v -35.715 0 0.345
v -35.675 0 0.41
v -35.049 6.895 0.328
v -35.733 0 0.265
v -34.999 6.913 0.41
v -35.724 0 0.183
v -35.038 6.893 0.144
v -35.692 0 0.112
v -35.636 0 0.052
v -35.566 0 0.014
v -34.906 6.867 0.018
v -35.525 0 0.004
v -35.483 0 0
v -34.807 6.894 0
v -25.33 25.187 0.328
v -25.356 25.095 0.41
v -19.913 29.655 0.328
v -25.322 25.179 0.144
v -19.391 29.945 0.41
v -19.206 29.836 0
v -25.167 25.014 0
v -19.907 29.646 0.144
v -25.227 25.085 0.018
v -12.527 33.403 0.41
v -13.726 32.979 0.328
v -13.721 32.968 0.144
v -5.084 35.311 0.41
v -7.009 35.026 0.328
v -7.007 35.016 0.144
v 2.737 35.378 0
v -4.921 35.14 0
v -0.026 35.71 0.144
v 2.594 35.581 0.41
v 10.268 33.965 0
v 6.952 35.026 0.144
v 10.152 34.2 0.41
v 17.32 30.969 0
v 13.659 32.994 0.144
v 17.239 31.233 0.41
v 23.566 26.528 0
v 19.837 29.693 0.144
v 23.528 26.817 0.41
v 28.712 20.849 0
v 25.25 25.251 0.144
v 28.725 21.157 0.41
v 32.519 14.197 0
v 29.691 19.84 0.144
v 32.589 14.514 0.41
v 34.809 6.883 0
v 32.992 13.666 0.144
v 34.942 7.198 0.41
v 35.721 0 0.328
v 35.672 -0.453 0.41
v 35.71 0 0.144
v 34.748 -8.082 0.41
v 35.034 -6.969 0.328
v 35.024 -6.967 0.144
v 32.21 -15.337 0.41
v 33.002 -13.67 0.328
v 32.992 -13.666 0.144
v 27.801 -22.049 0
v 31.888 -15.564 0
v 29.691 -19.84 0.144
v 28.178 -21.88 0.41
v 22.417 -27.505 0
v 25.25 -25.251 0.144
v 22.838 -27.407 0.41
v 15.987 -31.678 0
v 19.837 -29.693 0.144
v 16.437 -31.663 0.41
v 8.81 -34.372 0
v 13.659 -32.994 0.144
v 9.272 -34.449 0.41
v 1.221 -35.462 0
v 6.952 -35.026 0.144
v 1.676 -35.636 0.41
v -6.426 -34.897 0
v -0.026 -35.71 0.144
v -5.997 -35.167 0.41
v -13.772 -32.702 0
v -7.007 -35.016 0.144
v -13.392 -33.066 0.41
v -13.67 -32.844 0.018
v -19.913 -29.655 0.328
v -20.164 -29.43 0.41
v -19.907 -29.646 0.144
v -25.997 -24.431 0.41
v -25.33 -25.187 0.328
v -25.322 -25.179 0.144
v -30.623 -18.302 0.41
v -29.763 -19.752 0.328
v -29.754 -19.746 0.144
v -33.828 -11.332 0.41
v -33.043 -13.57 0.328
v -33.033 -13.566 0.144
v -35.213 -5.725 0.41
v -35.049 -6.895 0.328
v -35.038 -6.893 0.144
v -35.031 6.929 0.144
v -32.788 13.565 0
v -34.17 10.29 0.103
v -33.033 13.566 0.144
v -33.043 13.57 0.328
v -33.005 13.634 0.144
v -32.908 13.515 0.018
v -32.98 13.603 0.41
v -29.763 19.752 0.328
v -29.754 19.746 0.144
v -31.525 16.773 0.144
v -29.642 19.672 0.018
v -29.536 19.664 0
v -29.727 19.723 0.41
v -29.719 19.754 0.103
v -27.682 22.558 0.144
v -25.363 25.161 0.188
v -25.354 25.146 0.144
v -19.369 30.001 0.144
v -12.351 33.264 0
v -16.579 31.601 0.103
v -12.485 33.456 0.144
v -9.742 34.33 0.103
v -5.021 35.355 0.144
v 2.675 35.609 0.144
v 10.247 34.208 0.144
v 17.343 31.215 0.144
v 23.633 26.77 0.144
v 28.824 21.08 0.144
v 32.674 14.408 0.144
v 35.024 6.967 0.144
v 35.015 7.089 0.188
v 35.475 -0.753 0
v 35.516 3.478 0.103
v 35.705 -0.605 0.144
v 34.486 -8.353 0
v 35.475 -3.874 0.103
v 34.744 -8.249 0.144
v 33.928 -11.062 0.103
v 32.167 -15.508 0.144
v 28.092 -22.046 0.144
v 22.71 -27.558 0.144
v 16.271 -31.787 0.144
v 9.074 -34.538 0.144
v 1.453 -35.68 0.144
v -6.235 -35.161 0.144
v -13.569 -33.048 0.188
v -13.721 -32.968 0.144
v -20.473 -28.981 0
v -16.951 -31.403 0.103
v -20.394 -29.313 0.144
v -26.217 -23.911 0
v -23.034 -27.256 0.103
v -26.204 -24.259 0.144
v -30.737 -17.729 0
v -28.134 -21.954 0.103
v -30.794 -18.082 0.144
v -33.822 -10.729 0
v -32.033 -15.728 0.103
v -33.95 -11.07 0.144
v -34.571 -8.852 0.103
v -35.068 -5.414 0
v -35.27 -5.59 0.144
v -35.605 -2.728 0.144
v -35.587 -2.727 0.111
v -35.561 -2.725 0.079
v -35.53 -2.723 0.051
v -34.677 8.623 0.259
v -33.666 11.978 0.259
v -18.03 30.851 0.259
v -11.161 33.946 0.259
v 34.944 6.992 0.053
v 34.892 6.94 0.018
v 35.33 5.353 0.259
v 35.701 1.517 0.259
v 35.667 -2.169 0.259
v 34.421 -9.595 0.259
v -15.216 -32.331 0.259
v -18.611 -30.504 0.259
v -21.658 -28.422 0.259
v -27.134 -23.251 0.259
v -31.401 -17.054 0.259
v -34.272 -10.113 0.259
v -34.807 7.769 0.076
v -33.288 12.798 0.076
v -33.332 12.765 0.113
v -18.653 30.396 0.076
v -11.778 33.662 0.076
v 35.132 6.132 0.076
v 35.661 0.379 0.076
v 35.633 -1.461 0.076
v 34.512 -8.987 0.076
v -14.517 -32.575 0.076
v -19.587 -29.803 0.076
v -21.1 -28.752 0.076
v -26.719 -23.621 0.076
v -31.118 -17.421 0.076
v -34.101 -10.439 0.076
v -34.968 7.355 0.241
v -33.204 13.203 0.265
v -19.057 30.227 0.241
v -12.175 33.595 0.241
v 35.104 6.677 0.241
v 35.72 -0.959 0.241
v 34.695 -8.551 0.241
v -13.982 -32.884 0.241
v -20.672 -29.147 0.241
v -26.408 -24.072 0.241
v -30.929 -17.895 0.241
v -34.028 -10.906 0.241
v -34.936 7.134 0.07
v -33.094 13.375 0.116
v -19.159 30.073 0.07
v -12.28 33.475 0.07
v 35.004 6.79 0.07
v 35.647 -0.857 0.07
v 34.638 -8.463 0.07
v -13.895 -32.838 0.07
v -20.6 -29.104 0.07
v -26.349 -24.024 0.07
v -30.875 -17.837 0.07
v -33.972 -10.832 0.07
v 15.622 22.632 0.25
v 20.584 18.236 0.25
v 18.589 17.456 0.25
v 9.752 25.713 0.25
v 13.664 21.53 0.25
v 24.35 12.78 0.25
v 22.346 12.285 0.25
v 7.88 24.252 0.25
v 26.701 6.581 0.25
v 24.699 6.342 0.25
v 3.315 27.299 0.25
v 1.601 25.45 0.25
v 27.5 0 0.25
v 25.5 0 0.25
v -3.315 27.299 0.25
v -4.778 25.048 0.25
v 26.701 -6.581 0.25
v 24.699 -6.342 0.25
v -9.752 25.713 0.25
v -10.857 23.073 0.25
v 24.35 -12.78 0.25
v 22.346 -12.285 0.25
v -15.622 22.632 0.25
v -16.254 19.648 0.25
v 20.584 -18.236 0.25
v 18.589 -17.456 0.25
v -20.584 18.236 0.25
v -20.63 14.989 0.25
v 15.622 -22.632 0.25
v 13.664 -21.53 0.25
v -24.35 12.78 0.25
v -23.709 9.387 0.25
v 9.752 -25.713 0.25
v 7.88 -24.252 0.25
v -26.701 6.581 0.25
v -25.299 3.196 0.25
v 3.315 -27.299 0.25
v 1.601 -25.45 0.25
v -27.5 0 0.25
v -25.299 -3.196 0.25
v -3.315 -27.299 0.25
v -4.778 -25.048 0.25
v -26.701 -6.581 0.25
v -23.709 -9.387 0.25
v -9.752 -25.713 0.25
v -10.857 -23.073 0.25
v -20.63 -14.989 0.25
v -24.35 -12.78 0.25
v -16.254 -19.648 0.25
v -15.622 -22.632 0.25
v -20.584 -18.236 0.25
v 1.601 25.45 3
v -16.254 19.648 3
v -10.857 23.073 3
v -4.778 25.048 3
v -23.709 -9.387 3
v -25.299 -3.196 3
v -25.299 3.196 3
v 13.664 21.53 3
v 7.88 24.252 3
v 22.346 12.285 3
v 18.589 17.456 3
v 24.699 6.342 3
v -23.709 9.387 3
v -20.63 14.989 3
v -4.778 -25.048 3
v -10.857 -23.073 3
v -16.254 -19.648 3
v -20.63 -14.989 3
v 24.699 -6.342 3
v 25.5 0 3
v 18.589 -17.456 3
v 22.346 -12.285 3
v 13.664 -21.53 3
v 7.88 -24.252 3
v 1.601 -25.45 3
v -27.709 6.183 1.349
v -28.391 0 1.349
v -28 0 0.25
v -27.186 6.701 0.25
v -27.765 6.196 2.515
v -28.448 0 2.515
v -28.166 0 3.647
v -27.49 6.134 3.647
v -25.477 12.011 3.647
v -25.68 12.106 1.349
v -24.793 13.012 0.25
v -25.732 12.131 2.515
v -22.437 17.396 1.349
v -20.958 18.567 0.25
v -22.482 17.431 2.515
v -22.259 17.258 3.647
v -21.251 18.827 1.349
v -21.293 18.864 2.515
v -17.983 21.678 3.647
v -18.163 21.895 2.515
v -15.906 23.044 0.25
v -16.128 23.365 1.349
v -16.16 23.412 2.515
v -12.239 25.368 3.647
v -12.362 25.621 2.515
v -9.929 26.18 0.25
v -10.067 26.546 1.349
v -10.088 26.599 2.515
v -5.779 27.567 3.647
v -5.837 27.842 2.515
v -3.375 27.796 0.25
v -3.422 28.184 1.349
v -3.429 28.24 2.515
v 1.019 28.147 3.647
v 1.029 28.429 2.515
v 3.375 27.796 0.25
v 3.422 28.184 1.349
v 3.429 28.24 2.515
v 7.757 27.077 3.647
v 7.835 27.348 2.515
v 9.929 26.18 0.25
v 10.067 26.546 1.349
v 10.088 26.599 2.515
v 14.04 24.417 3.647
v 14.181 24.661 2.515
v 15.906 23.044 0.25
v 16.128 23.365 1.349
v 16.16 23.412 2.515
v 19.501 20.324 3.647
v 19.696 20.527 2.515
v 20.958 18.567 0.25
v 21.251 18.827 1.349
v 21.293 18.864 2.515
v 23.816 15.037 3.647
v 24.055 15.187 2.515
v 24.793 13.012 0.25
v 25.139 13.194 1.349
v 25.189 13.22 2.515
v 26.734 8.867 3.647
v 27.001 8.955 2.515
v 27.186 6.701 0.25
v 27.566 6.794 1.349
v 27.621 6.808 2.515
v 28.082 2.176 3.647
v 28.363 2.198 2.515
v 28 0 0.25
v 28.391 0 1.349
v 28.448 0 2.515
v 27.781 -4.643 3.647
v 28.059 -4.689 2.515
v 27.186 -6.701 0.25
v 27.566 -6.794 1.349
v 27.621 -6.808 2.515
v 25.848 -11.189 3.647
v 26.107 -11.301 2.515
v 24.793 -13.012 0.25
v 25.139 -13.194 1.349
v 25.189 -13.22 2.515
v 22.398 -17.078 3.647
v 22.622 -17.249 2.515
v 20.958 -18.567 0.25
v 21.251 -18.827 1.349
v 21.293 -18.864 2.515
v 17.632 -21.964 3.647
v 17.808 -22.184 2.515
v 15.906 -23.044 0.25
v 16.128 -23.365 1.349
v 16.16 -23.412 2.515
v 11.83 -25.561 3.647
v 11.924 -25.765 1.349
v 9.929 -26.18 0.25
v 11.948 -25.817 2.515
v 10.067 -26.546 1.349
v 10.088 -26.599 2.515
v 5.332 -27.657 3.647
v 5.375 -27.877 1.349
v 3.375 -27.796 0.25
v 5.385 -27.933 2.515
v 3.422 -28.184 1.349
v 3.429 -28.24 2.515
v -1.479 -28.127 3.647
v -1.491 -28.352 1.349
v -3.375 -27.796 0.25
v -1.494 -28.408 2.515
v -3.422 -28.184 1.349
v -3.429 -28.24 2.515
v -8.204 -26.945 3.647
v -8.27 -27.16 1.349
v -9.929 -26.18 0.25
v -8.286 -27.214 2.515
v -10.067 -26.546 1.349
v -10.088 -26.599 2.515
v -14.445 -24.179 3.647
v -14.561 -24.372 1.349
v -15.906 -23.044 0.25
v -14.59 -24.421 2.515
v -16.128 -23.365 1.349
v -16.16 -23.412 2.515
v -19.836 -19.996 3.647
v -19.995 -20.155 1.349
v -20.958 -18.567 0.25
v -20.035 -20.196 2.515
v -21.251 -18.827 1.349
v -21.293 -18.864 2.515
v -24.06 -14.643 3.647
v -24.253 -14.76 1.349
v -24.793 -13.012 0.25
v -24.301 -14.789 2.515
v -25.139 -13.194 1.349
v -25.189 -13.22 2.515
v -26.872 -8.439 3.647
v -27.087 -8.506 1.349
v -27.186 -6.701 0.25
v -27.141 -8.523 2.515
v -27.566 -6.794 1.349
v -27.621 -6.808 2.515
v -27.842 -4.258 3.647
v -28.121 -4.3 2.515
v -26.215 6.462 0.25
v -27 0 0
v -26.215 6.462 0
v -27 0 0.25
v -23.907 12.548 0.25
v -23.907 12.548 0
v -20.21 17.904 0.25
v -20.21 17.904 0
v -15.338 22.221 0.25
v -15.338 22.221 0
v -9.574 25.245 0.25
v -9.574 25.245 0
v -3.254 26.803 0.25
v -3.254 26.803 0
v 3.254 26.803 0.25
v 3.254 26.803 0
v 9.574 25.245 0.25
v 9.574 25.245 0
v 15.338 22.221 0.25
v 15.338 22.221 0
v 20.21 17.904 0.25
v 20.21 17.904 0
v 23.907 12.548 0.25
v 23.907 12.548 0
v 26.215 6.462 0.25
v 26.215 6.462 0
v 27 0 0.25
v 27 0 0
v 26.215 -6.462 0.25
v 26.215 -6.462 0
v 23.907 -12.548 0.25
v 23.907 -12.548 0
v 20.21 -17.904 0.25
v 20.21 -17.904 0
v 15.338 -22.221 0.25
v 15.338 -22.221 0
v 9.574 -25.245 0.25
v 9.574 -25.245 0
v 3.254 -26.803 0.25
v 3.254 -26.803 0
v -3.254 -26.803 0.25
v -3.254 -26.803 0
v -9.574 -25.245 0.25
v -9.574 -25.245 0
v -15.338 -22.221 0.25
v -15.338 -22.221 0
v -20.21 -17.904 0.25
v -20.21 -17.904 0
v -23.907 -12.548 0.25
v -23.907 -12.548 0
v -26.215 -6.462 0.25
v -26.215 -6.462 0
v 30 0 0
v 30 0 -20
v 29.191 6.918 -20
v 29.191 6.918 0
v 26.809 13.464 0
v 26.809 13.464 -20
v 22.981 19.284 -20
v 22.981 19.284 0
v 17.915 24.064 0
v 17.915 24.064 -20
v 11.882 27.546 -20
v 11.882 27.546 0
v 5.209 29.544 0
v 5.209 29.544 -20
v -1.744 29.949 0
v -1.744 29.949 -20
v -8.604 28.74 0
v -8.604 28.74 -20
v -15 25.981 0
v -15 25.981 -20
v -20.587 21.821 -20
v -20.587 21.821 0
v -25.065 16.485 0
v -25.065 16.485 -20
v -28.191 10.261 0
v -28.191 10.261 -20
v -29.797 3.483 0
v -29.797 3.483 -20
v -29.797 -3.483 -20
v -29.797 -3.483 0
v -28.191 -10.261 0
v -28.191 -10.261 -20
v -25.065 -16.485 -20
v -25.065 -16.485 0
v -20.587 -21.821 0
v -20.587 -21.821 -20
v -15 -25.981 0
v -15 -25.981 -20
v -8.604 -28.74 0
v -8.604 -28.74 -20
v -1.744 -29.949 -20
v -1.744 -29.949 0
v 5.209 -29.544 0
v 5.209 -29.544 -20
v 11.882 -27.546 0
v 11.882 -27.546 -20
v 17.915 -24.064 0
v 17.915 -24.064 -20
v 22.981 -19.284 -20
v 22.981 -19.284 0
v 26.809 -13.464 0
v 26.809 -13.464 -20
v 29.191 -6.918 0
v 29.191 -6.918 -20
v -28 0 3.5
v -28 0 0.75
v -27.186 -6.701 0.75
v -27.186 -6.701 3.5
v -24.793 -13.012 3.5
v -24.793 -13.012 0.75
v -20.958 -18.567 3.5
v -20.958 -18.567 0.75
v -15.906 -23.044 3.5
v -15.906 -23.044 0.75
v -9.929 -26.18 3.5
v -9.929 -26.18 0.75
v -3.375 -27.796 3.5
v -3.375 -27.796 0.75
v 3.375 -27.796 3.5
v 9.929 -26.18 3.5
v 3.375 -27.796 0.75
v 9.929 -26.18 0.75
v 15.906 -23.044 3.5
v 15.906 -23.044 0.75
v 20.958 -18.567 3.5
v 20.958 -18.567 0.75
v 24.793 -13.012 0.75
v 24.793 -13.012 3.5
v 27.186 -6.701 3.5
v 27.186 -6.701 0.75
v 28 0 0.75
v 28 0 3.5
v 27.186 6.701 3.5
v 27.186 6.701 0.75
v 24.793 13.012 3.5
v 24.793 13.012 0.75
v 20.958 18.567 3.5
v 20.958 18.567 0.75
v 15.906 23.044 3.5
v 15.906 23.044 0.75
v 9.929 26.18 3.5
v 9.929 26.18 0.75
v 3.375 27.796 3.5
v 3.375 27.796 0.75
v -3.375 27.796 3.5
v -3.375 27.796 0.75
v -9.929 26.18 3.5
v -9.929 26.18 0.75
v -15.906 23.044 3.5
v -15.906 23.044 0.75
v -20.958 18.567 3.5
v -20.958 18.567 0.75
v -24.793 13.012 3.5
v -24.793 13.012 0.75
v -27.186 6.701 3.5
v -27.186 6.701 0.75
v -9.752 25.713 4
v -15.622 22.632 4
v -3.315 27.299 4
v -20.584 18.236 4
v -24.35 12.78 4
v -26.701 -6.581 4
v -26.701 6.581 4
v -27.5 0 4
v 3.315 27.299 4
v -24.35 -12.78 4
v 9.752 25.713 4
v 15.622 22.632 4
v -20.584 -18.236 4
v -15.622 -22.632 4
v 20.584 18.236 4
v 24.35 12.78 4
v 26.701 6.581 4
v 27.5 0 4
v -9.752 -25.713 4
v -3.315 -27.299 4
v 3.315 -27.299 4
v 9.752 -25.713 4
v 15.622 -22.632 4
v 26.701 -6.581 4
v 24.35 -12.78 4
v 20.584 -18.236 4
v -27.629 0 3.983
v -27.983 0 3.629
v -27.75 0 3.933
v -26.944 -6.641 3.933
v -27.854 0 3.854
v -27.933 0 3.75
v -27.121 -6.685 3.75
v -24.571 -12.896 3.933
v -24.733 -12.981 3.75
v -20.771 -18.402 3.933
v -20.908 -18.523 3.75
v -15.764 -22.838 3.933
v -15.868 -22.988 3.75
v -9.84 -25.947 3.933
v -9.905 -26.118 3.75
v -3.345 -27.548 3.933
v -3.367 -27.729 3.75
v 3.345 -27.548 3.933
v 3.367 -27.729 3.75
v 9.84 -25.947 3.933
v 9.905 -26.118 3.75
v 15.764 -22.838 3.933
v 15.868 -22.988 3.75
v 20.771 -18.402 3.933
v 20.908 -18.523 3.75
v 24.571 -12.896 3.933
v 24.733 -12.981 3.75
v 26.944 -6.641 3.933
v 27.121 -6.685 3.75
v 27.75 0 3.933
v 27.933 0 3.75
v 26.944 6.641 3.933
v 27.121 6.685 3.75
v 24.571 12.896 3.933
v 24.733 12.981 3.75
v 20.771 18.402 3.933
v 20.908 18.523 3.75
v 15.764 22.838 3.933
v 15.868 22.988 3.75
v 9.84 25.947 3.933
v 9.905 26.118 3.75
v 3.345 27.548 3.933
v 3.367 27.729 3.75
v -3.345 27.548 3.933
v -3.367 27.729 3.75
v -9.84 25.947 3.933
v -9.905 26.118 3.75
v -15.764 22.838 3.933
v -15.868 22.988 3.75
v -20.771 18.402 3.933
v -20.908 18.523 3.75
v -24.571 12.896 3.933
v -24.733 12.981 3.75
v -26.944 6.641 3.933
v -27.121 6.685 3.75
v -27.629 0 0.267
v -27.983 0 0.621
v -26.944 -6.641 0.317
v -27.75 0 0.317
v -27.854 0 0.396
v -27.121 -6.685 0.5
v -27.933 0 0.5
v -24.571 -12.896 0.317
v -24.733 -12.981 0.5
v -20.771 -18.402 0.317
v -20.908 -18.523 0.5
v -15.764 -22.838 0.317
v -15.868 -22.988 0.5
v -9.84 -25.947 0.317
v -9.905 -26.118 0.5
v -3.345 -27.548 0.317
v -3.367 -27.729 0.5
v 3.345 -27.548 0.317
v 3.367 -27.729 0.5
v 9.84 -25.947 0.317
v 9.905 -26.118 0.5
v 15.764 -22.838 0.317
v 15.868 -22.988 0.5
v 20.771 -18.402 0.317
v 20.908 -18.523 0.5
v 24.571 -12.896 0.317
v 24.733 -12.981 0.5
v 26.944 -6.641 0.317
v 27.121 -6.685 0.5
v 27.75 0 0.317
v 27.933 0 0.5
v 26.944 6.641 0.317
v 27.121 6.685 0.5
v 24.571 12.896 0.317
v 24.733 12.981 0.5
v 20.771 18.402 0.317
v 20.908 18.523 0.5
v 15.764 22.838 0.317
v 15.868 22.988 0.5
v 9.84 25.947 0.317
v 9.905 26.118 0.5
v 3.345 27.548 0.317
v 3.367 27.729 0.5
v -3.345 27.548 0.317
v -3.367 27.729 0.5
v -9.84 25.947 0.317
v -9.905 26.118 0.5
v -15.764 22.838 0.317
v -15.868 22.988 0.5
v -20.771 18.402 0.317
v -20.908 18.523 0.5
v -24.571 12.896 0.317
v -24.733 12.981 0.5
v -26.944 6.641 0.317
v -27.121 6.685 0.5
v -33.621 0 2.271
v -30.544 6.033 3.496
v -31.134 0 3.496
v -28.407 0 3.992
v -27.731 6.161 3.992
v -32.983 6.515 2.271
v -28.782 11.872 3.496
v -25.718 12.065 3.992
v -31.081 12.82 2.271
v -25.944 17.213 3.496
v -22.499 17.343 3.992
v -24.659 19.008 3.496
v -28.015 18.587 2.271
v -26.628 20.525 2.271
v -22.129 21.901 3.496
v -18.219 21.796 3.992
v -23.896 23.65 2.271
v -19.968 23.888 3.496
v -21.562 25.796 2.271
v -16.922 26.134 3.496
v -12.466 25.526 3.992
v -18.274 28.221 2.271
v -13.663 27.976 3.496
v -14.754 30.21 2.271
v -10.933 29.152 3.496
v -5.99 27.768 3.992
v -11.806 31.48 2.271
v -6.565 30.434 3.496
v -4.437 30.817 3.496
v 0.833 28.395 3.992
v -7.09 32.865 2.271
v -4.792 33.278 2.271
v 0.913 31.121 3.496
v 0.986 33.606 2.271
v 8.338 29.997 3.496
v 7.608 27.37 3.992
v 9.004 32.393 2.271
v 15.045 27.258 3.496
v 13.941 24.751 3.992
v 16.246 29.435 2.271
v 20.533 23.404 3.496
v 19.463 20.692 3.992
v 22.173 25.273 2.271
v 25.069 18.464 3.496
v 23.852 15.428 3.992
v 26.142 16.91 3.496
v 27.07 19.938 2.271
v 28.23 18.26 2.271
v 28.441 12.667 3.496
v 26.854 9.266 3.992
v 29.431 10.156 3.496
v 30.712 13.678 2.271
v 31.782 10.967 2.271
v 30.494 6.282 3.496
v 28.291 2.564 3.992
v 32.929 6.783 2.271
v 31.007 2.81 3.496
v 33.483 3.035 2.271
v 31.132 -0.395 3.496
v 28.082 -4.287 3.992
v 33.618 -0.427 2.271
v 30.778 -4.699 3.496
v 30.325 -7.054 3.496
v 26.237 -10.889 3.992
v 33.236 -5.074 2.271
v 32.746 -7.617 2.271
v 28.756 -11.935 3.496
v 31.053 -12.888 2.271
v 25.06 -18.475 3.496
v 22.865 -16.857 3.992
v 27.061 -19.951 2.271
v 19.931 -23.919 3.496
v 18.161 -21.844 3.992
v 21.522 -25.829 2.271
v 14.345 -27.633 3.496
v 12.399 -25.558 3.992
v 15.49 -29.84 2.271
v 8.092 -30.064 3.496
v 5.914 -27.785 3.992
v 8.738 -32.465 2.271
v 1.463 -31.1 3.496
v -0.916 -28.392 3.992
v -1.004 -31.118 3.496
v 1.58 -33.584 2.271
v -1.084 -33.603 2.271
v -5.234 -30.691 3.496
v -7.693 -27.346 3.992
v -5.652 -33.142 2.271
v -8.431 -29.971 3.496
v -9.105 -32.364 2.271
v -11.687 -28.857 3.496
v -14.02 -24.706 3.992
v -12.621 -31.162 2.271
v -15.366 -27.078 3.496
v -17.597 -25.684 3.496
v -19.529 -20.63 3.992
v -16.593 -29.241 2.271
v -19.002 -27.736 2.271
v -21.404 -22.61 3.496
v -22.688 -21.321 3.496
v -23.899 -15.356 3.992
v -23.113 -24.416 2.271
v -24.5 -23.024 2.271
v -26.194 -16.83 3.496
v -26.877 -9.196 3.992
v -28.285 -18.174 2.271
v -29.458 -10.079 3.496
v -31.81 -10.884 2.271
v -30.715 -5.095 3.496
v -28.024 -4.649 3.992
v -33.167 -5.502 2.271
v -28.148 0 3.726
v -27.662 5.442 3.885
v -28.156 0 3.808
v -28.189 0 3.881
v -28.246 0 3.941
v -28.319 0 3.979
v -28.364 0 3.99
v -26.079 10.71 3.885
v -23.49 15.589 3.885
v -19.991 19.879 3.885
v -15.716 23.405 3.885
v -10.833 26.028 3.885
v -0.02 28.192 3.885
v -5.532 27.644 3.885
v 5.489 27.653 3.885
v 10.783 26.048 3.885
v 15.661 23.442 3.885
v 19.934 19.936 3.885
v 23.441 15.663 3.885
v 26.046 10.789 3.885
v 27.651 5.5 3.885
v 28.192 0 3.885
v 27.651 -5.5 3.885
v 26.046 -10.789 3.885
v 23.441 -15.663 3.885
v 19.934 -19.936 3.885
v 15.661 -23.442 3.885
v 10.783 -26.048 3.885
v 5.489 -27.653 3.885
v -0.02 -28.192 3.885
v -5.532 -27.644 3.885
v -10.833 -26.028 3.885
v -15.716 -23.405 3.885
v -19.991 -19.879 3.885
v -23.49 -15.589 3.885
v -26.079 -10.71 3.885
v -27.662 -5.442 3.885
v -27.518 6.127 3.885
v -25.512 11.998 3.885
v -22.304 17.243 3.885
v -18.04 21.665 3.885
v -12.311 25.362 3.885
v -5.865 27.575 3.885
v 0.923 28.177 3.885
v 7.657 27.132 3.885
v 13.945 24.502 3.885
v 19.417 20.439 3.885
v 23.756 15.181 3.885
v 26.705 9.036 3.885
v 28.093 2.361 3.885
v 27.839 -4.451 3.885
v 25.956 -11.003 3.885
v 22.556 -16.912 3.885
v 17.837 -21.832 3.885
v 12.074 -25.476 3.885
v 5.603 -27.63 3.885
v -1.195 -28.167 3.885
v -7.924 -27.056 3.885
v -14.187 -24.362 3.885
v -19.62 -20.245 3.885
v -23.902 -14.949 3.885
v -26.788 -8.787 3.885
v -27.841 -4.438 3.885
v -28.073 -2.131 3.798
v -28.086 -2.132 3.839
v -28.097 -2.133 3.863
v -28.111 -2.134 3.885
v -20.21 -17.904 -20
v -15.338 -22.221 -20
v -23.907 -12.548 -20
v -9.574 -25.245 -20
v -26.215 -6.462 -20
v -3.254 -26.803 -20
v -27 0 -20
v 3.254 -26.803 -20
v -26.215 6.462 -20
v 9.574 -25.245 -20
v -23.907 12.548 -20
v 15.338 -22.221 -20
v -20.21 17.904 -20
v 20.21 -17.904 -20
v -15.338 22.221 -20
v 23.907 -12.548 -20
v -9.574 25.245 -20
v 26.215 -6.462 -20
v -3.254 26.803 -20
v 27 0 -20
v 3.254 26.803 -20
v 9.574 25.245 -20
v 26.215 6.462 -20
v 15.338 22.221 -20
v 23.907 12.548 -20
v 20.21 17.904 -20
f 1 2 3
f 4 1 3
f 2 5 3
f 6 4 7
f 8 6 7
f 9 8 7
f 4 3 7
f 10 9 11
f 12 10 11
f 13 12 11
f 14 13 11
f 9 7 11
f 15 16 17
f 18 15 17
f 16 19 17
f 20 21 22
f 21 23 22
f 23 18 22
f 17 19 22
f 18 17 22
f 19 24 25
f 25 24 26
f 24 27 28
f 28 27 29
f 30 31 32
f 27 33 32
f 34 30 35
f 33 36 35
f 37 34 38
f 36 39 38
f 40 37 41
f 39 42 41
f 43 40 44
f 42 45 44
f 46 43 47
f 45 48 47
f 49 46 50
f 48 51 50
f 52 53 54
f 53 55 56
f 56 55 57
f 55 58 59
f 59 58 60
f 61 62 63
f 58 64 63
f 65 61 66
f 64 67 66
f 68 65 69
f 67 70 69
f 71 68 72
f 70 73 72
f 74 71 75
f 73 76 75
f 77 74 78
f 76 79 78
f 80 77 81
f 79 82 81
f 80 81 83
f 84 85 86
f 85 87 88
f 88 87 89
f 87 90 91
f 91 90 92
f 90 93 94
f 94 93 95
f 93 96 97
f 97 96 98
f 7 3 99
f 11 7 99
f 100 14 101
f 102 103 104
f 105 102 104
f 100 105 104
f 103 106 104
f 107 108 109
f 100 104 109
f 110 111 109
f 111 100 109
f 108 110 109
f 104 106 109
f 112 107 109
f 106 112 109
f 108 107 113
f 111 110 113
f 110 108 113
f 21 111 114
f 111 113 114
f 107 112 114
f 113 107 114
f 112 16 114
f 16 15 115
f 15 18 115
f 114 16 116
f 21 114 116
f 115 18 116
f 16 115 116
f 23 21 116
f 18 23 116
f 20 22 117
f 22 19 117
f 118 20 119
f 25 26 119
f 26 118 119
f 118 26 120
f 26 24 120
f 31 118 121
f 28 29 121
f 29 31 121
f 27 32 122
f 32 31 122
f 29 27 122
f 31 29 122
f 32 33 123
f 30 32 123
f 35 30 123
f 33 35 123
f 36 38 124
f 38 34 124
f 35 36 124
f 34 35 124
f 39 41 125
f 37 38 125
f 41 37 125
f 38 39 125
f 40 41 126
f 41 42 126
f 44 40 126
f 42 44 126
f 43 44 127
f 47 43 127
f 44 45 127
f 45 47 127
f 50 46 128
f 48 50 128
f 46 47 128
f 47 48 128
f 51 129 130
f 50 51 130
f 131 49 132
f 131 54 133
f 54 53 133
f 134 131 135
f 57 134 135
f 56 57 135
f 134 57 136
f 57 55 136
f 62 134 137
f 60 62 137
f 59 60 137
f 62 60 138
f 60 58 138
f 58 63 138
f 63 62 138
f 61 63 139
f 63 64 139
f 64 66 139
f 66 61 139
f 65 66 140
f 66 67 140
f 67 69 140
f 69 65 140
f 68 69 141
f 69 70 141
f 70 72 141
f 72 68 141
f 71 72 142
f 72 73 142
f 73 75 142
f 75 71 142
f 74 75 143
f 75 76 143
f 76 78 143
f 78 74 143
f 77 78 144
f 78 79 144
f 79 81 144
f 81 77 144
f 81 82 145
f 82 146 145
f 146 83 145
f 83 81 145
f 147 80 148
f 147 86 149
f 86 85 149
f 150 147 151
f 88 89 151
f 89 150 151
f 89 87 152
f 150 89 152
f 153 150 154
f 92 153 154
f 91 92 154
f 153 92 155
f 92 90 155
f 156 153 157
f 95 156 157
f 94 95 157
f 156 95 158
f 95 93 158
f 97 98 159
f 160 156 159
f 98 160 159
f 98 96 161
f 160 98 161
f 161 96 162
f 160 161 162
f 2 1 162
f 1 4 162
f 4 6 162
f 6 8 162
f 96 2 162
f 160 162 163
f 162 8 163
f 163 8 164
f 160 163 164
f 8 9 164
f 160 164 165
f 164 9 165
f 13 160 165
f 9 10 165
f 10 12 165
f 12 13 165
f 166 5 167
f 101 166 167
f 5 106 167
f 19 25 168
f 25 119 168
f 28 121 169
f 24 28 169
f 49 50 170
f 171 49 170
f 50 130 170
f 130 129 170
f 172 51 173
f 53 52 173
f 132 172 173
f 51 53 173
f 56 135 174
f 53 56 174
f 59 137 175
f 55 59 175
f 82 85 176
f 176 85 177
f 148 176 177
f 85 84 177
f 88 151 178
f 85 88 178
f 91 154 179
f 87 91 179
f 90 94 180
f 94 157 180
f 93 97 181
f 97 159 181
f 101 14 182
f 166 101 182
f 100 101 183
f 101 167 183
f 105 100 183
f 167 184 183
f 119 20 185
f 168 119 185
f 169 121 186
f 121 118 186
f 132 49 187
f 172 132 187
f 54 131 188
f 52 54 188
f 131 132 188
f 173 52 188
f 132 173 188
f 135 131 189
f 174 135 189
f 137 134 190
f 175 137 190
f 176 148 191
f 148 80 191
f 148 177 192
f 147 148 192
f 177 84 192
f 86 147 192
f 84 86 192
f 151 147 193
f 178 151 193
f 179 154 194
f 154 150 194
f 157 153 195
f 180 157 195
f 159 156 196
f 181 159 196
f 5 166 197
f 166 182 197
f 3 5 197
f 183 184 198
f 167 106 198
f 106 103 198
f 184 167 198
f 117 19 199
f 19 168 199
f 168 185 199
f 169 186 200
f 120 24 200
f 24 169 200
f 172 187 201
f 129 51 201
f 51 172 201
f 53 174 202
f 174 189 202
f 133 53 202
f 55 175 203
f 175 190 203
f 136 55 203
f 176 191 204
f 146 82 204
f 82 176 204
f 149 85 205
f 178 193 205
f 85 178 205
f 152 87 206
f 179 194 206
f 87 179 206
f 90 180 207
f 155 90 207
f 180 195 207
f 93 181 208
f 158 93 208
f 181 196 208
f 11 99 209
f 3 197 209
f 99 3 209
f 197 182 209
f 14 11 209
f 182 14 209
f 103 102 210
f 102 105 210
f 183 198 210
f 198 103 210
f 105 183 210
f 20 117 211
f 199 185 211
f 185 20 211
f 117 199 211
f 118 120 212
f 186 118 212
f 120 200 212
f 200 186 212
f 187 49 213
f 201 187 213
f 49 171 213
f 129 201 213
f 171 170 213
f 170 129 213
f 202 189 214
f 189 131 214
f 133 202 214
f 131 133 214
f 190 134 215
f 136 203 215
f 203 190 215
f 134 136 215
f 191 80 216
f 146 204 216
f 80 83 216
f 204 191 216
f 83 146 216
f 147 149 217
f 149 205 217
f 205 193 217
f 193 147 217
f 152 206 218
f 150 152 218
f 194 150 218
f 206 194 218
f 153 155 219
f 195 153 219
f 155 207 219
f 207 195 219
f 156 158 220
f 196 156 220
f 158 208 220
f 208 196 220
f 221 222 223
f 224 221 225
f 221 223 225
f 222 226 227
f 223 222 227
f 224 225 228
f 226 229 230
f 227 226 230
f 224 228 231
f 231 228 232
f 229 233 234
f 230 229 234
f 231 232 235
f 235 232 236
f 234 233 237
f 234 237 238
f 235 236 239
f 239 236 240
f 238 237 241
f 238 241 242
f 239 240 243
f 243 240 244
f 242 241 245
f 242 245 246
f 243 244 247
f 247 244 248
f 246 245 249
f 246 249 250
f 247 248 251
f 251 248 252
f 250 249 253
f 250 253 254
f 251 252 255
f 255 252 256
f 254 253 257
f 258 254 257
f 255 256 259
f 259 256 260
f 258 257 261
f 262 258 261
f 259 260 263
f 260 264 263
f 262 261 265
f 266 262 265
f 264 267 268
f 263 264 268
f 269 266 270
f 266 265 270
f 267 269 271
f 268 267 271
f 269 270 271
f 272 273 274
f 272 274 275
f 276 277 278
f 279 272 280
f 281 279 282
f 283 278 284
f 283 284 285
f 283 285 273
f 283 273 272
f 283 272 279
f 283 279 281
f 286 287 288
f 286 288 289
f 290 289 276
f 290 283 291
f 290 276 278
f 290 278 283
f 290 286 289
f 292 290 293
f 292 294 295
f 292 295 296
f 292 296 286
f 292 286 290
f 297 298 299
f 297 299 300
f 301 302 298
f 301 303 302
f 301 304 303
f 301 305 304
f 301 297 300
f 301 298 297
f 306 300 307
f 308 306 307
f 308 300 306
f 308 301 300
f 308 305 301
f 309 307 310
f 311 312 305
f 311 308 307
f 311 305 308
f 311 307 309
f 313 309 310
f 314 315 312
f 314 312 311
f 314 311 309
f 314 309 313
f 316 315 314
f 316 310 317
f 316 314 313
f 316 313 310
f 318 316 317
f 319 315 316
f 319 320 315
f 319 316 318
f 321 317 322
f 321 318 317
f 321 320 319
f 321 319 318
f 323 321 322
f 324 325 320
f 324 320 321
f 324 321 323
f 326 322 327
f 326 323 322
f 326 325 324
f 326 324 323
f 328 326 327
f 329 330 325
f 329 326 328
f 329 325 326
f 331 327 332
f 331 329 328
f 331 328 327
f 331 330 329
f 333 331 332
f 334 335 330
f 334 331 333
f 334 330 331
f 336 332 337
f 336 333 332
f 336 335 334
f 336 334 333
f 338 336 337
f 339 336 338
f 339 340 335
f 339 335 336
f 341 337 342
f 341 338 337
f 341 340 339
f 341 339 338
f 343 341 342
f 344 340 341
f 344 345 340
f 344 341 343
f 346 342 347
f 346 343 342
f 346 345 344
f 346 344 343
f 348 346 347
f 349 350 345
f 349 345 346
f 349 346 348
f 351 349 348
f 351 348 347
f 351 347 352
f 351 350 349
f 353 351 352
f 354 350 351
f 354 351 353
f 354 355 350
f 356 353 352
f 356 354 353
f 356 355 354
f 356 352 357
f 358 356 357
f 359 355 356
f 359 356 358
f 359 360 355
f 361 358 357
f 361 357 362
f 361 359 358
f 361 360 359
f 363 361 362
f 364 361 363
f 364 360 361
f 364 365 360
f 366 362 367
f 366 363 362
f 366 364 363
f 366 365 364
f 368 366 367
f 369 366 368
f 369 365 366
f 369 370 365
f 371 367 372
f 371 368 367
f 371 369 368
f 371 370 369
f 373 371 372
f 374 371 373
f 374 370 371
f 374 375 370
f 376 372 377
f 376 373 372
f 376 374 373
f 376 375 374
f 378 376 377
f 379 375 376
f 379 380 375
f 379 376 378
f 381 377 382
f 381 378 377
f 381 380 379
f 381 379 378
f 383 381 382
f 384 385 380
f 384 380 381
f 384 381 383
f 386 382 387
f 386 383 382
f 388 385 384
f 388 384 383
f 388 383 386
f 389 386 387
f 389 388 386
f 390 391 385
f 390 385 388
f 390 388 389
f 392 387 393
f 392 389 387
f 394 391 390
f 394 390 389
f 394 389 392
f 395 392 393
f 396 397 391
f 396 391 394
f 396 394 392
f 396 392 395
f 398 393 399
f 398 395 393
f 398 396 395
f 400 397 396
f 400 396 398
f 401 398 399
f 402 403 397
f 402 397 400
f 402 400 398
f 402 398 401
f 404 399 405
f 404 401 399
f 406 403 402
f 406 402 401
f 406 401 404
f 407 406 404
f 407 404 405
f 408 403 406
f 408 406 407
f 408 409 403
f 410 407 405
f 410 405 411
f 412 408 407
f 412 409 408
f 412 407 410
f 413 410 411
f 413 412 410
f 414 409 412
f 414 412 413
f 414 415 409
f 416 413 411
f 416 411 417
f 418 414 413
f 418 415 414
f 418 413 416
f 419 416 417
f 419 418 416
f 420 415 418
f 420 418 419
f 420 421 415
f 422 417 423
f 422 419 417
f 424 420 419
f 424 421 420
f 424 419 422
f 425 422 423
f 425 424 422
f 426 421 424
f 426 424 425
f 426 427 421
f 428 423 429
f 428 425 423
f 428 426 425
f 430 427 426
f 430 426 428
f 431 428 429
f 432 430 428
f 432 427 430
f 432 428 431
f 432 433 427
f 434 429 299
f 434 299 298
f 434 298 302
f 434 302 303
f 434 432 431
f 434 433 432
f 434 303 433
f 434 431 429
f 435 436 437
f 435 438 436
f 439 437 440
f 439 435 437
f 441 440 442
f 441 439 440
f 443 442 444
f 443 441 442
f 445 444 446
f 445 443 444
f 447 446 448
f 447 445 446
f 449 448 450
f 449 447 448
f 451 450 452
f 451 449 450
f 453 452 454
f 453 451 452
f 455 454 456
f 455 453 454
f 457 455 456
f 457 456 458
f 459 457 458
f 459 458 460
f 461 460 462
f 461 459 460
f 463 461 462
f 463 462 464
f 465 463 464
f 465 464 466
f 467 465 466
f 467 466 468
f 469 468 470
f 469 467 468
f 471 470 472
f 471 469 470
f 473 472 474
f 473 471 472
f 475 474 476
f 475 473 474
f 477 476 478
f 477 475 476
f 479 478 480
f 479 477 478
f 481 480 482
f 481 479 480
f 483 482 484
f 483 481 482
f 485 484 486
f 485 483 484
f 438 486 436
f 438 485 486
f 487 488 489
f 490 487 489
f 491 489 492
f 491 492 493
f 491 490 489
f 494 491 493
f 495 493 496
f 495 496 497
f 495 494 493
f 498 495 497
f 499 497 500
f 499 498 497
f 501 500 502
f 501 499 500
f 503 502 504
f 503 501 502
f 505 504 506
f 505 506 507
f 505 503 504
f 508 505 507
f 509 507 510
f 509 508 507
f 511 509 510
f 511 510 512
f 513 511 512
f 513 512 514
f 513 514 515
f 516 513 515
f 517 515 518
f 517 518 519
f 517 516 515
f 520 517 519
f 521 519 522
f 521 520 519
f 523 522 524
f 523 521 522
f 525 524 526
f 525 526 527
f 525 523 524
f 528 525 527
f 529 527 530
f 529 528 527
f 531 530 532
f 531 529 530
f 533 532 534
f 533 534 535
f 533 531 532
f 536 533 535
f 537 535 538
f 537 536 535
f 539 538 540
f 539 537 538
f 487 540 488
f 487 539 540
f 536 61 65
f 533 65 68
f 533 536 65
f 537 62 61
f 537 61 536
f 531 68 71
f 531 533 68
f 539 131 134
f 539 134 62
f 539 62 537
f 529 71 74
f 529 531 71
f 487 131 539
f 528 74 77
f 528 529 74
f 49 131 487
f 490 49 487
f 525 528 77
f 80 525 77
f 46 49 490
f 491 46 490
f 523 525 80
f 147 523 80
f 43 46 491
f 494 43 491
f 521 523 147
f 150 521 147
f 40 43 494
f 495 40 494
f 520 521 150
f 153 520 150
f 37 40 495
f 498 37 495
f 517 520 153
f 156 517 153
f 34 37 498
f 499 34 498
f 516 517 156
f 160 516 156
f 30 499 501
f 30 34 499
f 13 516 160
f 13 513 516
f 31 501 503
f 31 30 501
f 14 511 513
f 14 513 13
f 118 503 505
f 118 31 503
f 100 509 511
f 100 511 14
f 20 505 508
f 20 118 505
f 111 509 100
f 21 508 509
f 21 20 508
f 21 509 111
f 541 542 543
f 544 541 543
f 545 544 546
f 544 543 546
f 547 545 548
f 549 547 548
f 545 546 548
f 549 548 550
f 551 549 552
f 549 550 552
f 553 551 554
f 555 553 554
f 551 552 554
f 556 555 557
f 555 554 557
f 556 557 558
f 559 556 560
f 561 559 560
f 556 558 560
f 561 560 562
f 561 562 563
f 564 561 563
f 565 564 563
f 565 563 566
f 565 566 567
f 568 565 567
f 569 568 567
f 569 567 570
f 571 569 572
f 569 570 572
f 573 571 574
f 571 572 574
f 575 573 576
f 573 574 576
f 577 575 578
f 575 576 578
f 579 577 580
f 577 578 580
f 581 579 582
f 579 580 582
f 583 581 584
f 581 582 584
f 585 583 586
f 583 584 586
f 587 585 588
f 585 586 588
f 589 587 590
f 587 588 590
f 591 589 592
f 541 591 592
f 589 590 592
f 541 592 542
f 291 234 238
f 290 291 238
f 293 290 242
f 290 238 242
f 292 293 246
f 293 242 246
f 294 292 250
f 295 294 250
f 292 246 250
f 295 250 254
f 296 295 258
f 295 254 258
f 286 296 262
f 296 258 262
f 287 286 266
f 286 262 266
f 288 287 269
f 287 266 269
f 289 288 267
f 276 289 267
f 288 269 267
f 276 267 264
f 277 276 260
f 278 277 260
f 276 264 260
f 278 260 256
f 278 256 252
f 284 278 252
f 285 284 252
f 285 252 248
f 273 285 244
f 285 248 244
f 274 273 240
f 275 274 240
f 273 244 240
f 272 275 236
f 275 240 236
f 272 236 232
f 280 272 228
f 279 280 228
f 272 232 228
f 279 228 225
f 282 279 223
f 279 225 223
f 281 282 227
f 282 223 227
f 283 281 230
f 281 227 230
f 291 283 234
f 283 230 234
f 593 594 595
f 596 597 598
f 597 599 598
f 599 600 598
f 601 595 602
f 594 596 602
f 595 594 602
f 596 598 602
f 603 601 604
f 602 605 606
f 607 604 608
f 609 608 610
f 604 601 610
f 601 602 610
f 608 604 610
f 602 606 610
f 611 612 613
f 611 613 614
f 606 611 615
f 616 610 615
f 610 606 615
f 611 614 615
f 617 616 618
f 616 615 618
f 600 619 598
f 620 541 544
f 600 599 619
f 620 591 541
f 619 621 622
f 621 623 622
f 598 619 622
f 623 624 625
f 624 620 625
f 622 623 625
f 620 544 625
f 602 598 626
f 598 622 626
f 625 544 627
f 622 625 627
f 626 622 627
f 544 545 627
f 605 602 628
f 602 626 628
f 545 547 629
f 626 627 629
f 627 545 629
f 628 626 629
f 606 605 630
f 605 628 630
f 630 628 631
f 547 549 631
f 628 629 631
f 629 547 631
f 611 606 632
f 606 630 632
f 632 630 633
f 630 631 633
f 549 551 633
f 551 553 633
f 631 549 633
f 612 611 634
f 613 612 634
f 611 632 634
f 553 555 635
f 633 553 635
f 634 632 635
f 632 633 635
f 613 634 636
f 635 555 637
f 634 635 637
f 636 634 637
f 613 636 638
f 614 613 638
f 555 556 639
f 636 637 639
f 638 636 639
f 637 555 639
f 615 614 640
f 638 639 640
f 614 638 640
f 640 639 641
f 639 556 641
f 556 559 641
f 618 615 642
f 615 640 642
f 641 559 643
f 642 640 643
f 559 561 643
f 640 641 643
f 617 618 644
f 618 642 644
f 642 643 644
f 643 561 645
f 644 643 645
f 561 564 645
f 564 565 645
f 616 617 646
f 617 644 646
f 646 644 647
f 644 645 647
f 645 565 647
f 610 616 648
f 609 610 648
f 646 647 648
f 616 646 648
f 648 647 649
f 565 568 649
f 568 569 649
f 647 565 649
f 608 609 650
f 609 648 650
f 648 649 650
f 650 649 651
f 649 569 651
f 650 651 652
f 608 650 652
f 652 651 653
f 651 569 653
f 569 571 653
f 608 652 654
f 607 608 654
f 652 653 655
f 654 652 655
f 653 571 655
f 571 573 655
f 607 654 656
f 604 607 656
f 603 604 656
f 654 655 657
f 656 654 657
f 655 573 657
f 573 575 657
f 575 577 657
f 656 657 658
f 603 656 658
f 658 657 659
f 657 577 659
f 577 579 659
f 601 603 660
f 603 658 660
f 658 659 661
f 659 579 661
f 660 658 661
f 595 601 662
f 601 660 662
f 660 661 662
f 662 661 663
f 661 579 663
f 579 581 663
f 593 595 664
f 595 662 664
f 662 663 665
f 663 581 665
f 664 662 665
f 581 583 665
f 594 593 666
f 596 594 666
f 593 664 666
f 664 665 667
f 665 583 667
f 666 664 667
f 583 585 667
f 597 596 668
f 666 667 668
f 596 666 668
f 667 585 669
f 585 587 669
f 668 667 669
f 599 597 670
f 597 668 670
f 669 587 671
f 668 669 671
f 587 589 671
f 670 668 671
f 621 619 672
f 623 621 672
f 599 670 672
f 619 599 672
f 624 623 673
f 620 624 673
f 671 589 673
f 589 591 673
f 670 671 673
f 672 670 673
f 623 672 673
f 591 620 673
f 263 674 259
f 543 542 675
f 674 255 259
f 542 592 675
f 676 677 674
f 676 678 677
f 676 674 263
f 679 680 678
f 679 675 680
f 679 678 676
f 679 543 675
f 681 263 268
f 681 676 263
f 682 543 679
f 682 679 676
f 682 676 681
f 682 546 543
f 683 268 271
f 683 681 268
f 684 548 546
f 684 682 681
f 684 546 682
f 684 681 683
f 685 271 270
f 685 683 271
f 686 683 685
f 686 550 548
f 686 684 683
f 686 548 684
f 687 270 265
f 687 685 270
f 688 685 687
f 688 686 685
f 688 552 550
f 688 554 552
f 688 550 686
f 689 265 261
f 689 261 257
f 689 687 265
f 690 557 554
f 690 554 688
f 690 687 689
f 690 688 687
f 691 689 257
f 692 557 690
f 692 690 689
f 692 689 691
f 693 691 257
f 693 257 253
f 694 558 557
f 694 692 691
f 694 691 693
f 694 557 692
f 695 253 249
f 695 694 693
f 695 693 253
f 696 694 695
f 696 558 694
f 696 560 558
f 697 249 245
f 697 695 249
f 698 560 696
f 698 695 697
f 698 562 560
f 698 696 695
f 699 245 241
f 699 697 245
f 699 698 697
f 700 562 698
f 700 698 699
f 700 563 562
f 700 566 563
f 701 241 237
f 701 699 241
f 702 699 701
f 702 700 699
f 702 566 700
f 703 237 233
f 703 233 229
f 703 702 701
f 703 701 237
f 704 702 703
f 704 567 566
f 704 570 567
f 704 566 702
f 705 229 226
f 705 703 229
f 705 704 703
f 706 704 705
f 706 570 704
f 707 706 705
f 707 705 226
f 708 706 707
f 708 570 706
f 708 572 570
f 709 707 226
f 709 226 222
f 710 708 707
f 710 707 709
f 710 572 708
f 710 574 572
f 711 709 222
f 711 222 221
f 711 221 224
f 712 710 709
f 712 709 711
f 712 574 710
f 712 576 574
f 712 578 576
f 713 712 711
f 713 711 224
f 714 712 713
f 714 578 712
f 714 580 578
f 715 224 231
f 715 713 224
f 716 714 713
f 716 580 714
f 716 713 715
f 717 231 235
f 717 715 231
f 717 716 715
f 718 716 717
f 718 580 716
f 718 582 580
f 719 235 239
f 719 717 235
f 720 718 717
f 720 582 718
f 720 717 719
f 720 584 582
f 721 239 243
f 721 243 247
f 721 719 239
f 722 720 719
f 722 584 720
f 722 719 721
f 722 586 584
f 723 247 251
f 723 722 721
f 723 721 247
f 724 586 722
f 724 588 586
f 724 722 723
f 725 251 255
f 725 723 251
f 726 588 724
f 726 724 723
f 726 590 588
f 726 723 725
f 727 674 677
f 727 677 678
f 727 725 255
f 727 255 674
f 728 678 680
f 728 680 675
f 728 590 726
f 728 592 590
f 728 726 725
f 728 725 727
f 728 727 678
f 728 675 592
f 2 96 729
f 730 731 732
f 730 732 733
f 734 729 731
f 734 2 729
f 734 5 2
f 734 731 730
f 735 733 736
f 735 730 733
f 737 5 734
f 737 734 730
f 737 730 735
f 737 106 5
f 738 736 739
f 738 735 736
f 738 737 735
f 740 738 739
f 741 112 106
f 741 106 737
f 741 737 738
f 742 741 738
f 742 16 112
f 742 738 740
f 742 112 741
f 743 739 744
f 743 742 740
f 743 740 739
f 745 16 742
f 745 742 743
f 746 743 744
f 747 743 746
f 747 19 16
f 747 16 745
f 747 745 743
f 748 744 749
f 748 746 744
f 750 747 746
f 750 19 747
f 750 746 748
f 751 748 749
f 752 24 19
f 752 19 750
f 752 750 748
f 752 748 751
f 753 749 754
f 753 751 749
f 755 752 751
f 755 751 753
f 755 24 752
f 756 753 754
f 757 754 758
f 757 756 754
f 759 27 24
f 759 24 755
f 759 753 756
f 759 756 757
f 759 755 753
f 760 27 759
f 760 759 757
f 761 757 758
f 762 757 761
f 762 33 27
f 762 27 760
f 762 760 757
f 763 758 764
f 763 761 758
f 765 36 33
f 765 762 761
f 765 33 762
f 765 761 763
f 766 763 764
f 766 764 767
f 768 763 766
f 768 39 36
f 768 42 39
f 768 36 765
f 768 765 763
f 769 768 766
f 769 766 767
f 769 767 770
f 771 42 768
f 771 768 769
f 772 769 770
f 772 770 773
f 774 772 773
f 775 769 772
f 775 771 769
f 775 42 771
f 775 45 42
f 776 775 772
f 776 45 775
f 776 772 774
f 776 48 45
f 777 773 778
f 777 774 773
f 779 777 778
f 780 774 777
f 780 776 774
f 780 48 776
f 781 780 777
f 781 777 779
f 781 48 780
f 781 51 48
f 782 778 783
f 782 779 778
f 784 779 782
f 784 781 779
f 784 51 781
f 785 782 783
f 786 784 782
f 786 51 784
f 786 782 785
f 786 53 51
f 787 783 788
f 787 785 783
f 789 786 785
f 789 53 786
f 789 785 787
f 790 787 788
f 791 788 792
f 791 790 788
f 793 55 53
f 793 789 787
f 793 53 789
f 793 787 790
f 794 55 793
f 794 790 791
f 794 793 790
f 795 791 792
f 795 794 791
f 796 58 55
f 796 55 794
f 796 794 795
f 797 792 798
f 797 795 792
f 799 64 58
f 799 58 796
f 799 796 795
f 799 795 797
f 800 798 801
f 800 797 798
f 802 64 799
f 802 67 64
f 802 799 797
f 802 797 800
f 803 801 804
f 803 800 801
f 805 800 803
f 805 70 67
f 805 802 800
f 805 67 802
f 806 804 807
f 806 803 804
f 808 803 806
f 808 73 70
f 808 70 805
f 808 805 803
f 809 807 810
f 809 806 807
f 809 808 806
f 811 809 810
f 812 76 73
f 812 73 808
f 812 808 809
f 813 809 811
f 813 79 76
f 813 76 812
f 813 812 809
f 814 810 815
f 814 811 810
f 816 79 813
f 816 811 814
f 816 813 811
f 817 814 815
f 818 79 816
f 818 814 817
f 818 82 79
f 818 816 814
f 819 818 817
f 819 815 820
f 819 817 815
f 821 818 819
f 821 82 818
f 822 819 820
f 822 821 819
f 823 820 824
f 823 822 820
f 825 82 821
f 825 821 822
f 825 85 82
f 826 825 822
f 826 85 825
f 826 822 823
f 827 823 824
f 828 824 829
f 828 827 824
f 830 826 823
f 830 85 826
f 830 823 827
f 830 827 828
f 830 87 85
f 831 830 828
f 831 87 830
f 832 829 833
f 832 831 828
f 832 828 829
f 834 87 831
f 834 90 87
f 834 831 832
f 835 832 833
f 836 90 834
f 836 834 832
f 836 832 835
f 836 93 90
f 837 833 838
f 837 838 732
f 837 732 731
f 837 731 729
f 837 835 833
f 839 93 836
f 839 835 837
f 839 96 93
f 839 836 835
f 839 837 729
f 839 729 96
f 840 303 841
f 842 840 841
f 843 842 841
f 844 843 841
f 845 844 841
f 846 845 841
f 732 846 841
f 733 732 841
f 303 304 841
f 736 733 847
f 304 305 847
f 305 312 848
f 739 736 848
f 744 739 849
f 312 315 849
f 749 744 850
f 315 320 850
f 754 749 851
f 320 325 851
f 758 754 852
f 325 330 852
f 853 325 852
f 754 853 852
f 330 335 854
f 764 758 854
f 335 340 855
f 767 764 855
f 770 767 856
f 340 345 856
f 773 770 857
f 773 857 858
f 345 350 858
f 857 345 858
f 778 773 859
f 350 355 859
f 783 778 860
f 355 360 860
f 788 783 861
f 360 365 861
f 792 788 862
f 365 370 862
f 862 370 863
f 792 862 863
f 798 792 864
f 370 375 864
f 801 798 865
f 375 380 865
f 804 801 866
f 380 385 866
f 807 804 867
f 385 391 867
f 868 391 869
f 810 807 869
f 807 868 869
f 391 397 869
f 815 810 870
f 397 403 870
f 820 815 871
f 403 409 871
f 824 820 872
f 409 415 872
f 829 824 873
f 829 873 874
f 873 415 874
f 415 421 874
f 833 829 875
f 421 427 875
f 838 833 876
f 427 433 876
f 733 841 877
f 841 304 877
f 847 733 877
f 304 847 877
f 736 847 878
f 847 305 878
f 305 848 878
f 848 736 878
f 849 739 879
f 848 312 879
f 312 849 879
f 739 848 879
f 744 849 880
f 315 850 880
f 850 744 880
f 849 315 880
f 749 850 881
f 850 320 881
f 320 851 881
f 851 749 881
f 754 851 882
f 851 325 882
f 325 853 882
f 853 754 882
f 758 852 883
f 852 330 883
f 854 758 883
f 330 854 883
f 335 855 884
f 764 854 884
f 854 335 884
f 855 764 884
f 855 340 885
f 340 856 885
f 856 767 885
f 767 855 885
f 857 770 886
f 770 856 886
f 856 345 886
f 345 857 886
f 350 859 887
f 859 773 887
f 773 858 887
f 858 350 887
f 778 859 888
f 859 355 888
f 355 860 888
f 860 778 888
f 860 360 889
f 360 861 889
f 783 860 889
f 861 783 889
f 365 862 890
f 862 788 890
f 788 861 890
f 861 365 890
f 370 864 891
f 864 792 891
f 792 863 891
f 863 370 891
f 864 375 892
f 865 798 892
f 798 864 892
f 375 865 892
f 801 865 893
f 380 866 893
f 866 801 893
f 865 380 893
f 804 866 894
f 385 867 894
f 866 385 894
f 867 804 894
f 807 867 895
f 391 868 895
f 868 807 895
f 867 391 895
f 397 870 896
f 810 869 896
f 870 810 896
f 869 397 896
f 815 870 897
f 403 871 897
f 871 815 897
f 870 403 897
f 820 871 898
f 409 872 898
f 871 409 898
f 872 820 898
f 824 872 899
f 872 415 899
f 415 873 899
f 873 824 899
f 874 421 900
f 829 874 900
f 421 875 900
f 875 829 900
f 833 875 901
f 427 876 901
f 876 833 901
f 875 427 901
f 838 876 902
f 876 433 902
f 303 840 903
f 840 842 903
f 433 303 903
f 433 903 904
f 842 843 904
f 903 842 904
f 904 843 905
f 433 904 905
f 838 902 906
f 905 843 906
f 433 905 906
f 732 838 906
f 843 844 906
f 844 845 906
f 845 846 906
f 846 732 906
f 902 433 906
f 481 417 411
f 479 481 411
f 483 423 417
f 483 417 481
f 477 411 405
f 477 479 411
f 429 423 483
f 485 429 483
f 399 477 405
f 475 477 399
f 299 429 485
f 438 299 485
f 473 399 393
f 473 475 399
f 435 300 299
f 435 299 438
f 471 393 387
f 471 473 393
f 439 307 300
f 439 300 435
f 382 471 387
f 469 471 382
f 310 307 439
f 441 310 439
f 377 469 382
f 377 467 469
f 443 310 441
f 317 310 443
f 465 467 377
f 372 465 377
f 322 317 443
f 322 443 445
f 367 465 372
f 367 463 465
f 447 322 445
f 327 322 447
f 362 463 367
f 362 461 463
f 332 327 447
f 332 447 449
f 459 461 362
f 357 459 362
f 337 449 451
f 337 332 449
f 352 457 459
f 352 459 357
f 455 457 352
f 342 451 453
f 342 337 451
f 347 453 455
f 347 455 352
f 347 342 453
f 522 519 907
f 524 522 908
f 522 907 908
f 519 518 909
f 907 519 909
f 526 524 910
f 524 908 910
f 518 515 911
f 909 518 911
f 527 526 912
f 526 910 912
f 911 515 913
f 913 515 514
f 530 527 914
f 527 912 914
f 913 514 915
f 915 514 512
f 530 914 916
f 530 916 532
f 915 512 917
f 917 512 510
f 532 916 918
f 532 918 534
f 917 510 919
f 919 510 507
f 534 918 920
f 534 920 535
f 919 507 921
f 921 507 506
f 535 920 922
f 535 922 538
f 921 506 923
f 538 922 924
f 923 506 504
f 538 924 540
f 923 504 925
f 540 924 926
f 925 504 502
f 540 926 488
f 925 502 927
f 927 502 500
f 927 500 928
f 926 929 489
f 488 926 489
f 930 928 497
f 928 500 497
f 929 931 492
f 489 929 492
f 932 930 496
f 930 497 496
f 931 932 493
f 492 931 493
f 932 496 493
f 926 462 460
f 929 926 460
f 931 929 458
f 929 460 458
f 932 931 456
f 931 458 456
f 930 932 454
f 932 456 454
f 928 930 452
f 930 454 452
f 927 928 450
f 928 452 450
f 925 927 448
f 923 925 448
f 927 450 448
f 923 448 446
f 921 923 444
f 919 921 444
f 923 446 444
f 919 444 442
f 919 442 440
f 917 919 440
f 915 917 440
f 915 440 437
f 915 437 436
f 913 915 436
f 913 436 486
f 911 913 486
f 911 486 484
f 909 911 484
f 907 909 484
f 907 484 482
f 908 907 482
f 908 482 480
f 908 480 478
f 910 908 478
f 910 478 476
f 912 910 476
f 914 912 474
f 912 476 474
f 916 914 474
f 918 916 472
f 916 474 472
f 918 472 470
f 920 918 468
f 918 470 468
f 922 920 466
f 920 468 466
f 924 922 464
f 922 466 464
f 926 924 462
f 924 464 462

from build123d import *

# Parameters (mm, degrees)
F0_R     = 30
F0_R_2   = 27
F1_DEPTH = 20
F4_R     = 0.25
F6_R     = 0.5
F7_R     = 25.5
F8_DEPTH = 2.75


with BuildPart() as f1:
    # F0 (on Top) → F1 (new body)
    with BuildSketch(Plane.XY):
        Circle(F0_R)
        Circle(F0_R_2, mode=Mode.SUBTRACT)
    extrude(amount=-F1_DEPTH)

    # F2 (on Front) → F3 (revolve)
    with BuildSketch(Plane.XZ):
        with BuildLine():
            Line((-30, 0), (-27, 0))
            Line((-27, 0), (-27, 0.25))
            Line((-27, 0.25), (-28, 0.25))
            ThreePointArc((-28, 0.25), (-28.4666764937, 2.125), (-28, 4))
            ThreePointArc((-28, 4), (-32.472135955, 2.94427191), (-36, 0))
            Line((-36, 0), (-30, 0))
        make_face()
    revolve(axis=Axis((0, 0, 2), (0, 0, -1)))

    # F4
    f4_edges = [f1.edges().sort_by_distance(p)[0] for p in [
        (28, 0, 4),
        (36, 0, 0),
    ]]
    fillet(f4_edges, radius=F4_R)


with BuildPart() as f5:
    # F2 (on Front) → F5 (revolve)
    with BuildSketch(Plane.XZ):
        Polygon((-28, 0.25), (-27, 0.25), (0, 0.25), (0, 4), (-28, 4), align=None)
    revolve(axis=Axis((0, 0, 2.125), (0, 0, 1)))

    # F6
    f6_edges = [f5.edges().sort_by_distance(p)[0] for p in [
        (28, 0, 4),
        (28, 0, 0.25),
    ]]
    fillet(f6_edges, radius=F6_R)

    # F7 (on face) → F8 (cut)
    with BuildSketch(Plane(origin=(0, 0, 0.25), x_dir=(1, 0, 0), z_dir=(0, 0, -1))):
        Circle(F7_R)
    extrude(amount=-F8_DEPTH, mode=Mode.SUBTRACT)


solid = Compound([f1.part, f5.part])
